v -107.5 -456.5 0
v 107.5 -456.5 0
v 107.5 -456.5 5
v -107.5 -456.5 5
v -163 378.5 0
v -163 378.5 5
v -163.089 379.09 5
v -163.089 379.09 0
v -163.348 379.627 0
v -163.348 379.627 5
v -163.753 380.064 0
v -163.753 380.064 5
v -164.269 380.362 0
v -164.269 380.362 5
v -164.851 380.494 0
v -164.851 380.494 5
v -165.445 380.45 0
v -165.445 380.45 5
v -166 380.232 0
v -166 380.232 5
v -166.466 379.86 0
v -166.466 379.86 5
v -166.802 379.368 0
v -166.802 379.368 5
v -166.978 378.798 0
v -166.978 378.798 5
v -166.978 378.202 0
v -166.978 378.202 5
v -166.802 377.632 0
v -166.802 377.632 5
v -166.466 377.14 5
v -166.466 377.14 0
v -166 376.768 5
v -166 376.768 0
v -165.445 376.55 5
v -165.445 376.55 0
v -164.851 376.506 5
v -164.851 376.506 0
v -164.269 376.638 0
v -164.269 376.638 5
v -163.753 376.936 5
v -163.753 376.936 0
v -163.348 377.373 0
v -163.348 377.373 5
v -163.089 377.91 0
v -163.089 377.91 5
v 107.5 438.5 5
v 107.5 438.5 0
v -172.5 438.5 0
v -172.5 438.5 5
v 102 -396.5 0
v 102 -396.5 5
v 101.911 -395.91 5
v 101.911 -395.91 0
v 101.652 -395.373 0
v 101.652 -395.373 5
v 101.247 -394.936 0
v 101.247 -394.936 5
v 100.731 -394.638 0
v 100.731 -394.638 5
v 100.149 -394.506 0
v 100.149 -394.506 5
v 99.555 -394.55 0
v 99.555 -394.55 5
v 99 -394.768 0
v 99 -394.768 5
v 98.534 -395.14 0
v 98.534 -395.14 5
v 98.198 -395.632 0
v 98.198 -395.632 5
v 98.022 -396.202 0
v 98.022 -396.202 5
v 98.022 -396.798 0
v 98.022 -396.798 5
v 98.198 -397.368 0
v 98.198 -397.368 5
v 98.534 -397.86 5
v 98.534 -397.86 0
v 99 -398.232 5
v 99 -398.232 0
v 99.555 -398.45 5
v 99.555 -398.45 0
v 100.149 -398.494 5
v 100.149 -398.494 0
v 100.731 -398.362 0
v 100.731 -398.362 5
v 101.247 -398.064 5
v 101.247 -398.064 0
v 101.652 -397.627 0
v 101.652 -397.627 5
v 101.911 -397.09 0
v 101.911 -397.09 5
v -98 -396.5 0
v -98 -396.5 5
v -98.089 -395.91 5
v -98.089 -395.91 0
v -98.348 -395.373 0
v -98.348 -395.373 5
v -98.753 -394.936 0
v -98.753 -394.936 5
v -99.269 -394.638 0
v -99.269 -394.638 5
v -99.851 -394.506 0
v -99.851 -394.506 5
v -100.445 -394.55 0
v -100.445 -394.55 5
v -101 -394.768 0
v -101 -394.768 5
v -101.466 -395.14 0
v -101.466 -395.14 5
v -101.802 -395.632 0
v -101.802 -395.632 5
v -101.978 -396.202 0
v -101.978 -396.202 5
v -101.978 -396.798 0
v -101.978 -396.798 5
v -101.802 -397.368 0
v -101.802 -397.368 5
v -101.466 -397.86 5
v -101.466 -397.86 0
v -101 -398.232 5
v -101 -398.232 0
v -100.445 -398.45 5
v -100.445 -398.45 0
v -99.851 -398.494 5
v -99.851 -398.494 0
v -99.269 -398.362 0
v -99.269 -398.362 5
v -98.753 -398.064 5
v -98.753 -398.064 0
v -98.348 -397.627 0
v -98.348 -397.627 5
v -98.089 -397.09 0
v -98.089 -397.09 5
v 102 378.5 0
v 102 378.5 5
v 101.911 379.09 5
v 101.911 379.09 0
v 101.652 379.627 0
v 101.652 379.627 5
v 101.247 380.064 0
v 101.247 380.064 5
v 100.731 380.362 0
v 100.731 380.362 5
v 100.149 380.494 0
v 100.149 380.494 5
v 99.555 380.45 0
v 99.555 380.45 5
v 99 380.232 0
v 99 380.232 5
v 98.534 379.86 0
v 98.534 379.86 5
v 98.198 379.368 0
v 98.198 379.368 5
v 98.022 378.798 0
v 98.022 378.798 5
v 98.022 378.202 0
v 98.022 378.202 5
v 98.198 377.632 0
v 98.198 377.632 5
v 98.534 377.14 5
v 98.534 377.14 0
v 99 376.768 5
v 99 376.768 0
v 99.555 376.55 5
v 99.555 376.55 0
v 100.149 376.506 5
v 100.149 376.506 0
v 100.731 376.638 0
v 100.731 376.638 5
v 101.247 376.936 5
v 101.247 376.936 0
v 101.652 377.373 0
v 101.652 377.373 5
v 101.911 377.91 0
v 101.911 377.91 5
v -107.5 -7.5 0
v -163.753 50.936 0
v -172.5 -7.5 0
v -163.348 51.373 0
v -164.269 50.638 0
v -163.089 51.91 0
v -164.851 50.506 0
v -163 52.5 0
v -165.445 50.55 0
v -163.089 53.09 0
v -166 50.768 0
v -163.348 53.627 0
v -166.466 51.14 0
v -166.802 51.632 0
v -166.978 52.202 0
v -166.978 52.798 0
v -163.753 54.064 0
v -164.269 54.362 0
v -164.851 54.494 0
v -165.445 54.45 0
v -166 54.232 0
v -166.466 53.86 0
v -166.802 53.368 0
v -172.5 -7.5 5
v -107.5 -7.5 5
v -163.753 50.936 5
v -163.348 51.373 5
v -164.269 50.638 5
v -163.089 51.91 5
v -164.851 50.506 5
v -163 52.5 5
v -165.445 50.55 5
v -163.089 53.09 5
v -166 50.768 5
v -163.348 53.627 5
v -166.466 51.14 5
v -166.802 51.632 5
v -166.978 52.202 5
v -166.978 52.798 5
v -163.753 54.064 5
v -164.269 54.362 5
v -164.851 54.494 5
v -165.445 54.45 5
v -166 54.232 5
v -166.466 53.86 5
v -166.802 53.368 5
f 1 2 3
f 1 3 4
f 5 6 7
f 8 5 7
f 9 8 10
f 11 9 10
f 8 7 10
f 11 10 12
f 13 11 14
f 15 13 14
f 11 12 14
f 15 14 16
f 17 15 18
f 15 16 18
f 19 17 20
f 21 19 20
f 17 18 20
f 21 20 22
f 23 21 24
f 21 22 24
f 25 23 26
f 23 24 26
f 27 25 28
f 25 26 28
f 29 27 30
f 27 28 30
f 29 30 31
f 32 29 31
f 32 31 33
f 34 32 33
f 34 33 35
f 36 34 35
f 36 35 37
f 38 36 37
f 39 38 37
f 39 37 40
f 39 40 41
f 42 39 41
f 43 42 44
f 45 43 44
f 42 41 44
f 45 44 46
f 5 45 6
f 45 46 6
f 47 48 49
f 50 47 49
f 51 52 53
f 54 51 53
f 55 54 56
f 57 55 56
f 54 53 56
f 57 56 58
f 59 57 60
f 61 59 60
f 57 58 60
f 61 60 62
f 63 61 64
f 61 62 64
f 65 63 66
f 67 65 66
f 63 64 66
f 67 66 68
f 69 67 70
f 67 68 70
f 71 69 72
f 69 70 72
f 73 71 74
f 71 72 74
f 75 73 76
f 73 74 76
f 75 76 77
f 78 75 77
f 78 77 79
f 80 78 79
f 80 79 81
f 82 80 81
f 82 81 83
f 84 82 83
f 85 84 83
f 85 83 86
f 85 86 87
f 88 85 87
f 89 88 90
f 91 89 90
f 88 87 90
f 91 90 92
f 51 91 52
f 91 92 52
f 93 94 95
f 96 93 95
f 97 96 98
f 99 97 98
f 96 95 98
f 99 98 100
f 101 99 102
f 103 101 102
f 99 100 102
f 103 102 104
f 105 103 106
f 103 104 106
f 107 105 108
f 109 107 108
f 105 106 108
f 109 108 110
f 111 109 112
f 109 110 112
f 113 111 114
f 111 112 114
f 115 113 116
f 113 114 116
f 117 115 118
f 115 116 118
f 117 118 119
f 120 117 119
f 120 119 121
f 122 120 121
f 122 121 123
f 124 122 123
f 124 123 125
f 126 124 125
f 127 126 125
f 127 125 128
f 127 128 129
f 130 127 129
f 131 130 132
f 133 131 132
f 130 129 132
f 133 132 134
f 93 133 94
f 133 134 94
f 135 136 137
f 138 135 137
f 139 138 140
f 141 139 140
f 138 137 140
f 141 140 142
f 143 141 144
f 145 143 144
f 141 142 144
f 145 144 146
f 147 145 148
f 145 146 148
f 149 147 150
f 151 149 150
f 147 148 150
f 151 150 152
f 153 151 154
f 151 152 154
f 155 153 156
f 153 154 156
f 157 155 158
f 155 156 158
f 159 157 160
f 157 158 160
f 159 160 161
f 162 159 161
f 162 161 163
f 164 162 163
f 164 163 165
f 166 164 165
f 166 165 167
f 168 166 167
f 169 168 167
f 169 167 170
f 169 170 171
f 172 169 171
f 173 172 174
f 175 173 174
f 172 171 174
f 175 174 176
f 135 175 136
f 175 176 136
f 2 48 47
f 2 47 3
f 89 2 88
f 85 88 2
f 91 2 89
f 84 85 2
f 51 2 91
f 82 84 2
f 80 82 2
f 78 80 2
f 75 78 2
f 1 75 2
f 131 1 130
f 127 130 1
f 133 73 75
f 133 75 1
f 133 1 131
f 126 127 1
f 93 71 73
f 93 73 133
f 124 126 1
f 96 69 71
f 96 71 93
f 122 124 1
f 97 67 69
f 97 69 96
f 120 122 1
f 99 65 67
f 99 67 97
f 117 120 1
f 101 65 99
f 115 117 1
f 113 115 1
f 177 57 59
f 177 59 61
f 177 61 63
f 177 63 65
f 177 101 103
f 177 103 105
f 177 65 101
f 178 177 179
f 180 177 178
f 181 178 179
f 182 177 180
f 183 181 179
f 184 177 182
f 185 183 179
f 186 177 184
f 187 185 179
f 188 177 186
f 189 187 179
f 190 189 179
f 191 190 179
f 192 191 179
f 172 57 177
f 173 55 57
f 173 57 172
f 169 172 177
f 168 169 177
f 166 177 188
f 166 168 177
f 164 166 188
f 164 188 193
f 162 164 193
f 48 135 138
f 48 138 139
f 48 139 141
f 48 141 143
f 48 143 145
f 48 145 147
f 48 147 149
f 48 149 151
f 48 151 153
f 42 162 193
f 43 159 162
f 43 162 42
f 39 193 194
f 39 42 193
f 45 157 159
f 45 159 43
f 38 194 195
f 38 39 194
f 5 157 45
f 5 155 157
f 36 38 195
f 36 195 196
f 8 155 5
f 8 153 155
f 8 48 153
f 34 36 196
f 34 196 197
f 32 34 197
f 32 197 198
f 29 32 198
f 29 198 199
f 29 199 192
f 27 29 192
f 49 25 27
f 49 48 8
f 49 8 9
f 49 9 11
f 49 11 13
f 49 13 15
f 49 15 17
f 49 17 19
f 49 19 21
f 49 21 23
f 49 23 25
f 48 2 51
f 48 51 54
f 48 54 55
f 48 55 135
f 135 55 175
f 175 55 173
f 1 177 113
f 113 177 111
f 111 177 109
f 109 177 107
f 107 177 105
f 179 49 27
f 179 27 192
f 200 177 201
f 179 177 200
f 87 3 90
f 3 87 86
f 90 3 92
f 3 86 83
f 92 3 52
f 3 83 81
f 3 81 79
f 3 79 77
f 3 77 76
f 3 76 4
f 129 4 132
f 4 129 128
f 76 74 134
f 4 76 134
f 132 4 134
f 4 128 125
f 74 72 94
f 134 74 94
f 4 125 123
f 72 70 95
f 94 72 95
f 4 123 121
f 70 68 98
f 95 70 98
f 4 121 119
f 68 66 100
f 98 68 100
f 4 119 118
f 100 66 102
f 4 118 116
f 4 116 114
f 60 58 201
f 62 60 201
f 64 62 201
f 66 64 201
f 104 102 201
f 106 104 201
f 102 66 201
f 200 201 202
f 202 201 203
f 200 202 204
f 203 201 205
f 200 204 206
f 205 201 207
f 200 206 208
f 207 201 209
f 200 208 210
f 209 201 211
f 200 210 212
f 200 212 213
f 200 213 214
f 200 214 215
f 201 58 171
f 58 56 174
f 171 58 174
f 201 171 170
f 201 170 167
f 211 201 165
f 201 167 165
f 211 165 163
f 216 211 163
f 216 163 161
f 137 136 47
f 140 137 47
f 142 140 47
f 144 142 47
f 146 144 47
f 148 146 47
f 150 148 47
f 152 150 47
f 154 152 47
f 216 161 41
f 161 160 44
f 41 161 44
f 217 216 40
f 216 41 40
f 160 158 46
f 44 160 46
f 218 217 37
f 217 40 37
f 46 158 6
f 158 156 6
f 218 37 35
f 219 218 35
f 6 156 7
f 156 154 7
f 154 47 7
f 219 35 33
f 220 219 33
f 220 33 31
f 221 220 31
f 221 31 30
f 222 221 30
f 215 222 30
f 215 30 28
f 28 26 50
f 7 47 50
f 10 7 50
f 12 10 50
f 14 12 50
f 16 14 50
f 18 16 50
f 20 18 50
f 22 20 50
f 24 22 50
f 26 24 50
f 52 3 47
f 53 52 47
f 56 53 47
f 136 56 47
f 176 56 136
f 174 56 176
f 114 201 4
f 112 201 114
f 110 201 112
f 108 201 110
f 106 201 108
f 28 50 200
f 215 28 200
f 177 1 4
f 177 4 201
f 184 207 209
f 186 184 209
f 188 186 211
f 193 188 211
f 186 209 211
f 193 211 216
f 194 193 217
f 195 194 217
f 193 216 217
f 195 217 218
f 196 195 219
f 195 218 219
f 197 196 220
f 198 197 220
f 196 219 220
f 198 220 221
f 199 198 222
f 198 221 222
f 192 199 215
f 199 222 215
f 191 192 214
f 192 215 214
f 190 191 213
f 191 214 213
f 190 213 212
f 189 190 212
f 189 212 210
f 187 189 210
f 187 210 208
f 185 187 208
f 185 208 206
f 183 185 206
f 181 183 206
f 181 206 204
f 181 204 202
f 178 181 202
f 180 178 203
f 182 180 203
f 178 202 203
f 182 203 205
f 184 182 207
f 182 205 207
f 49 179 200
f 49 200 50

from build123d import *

# Parameters (mm, degrees)
PAD_DEPTH    = 5
SKETCH001_R  = 2
POCKET_DEPTH = 5


with BuildPart() as part:
    # Sketch → Pad (new body)
    with BuildSketch(Plane.XY):
        Polygon((-107.5, 438.5), (107.5, 438.5), (107.5, -456.5), (-107.5, -456.5), (-107.5, -7.5), (-172.5, -7.5), (-172.5, 438.5), align=None)
    extrude(amount=PAD_DEPTH)

    # Sketch001 → Pocket (cut)
    with BuildSketch(Plane.XY.offset(5)):
        with Locations((-165, 378.5)):
            Circle(SKETCH001_R)
        with Locations((-165, 52.5)):
            Circle(SKETCH001_R)
        with Locations((-100, -396.5)):
            Circle(SKETCH001_R)
        with Locations((100, -396.5)):
            Circle(SKETCH001_R)
        with Locations((100, 378.5)):
            Circle(SKETCH001_R)
    extrude(amount=-POCKET_DEPTH, mode=Mode.SUBTRACT)


solid = part.part
